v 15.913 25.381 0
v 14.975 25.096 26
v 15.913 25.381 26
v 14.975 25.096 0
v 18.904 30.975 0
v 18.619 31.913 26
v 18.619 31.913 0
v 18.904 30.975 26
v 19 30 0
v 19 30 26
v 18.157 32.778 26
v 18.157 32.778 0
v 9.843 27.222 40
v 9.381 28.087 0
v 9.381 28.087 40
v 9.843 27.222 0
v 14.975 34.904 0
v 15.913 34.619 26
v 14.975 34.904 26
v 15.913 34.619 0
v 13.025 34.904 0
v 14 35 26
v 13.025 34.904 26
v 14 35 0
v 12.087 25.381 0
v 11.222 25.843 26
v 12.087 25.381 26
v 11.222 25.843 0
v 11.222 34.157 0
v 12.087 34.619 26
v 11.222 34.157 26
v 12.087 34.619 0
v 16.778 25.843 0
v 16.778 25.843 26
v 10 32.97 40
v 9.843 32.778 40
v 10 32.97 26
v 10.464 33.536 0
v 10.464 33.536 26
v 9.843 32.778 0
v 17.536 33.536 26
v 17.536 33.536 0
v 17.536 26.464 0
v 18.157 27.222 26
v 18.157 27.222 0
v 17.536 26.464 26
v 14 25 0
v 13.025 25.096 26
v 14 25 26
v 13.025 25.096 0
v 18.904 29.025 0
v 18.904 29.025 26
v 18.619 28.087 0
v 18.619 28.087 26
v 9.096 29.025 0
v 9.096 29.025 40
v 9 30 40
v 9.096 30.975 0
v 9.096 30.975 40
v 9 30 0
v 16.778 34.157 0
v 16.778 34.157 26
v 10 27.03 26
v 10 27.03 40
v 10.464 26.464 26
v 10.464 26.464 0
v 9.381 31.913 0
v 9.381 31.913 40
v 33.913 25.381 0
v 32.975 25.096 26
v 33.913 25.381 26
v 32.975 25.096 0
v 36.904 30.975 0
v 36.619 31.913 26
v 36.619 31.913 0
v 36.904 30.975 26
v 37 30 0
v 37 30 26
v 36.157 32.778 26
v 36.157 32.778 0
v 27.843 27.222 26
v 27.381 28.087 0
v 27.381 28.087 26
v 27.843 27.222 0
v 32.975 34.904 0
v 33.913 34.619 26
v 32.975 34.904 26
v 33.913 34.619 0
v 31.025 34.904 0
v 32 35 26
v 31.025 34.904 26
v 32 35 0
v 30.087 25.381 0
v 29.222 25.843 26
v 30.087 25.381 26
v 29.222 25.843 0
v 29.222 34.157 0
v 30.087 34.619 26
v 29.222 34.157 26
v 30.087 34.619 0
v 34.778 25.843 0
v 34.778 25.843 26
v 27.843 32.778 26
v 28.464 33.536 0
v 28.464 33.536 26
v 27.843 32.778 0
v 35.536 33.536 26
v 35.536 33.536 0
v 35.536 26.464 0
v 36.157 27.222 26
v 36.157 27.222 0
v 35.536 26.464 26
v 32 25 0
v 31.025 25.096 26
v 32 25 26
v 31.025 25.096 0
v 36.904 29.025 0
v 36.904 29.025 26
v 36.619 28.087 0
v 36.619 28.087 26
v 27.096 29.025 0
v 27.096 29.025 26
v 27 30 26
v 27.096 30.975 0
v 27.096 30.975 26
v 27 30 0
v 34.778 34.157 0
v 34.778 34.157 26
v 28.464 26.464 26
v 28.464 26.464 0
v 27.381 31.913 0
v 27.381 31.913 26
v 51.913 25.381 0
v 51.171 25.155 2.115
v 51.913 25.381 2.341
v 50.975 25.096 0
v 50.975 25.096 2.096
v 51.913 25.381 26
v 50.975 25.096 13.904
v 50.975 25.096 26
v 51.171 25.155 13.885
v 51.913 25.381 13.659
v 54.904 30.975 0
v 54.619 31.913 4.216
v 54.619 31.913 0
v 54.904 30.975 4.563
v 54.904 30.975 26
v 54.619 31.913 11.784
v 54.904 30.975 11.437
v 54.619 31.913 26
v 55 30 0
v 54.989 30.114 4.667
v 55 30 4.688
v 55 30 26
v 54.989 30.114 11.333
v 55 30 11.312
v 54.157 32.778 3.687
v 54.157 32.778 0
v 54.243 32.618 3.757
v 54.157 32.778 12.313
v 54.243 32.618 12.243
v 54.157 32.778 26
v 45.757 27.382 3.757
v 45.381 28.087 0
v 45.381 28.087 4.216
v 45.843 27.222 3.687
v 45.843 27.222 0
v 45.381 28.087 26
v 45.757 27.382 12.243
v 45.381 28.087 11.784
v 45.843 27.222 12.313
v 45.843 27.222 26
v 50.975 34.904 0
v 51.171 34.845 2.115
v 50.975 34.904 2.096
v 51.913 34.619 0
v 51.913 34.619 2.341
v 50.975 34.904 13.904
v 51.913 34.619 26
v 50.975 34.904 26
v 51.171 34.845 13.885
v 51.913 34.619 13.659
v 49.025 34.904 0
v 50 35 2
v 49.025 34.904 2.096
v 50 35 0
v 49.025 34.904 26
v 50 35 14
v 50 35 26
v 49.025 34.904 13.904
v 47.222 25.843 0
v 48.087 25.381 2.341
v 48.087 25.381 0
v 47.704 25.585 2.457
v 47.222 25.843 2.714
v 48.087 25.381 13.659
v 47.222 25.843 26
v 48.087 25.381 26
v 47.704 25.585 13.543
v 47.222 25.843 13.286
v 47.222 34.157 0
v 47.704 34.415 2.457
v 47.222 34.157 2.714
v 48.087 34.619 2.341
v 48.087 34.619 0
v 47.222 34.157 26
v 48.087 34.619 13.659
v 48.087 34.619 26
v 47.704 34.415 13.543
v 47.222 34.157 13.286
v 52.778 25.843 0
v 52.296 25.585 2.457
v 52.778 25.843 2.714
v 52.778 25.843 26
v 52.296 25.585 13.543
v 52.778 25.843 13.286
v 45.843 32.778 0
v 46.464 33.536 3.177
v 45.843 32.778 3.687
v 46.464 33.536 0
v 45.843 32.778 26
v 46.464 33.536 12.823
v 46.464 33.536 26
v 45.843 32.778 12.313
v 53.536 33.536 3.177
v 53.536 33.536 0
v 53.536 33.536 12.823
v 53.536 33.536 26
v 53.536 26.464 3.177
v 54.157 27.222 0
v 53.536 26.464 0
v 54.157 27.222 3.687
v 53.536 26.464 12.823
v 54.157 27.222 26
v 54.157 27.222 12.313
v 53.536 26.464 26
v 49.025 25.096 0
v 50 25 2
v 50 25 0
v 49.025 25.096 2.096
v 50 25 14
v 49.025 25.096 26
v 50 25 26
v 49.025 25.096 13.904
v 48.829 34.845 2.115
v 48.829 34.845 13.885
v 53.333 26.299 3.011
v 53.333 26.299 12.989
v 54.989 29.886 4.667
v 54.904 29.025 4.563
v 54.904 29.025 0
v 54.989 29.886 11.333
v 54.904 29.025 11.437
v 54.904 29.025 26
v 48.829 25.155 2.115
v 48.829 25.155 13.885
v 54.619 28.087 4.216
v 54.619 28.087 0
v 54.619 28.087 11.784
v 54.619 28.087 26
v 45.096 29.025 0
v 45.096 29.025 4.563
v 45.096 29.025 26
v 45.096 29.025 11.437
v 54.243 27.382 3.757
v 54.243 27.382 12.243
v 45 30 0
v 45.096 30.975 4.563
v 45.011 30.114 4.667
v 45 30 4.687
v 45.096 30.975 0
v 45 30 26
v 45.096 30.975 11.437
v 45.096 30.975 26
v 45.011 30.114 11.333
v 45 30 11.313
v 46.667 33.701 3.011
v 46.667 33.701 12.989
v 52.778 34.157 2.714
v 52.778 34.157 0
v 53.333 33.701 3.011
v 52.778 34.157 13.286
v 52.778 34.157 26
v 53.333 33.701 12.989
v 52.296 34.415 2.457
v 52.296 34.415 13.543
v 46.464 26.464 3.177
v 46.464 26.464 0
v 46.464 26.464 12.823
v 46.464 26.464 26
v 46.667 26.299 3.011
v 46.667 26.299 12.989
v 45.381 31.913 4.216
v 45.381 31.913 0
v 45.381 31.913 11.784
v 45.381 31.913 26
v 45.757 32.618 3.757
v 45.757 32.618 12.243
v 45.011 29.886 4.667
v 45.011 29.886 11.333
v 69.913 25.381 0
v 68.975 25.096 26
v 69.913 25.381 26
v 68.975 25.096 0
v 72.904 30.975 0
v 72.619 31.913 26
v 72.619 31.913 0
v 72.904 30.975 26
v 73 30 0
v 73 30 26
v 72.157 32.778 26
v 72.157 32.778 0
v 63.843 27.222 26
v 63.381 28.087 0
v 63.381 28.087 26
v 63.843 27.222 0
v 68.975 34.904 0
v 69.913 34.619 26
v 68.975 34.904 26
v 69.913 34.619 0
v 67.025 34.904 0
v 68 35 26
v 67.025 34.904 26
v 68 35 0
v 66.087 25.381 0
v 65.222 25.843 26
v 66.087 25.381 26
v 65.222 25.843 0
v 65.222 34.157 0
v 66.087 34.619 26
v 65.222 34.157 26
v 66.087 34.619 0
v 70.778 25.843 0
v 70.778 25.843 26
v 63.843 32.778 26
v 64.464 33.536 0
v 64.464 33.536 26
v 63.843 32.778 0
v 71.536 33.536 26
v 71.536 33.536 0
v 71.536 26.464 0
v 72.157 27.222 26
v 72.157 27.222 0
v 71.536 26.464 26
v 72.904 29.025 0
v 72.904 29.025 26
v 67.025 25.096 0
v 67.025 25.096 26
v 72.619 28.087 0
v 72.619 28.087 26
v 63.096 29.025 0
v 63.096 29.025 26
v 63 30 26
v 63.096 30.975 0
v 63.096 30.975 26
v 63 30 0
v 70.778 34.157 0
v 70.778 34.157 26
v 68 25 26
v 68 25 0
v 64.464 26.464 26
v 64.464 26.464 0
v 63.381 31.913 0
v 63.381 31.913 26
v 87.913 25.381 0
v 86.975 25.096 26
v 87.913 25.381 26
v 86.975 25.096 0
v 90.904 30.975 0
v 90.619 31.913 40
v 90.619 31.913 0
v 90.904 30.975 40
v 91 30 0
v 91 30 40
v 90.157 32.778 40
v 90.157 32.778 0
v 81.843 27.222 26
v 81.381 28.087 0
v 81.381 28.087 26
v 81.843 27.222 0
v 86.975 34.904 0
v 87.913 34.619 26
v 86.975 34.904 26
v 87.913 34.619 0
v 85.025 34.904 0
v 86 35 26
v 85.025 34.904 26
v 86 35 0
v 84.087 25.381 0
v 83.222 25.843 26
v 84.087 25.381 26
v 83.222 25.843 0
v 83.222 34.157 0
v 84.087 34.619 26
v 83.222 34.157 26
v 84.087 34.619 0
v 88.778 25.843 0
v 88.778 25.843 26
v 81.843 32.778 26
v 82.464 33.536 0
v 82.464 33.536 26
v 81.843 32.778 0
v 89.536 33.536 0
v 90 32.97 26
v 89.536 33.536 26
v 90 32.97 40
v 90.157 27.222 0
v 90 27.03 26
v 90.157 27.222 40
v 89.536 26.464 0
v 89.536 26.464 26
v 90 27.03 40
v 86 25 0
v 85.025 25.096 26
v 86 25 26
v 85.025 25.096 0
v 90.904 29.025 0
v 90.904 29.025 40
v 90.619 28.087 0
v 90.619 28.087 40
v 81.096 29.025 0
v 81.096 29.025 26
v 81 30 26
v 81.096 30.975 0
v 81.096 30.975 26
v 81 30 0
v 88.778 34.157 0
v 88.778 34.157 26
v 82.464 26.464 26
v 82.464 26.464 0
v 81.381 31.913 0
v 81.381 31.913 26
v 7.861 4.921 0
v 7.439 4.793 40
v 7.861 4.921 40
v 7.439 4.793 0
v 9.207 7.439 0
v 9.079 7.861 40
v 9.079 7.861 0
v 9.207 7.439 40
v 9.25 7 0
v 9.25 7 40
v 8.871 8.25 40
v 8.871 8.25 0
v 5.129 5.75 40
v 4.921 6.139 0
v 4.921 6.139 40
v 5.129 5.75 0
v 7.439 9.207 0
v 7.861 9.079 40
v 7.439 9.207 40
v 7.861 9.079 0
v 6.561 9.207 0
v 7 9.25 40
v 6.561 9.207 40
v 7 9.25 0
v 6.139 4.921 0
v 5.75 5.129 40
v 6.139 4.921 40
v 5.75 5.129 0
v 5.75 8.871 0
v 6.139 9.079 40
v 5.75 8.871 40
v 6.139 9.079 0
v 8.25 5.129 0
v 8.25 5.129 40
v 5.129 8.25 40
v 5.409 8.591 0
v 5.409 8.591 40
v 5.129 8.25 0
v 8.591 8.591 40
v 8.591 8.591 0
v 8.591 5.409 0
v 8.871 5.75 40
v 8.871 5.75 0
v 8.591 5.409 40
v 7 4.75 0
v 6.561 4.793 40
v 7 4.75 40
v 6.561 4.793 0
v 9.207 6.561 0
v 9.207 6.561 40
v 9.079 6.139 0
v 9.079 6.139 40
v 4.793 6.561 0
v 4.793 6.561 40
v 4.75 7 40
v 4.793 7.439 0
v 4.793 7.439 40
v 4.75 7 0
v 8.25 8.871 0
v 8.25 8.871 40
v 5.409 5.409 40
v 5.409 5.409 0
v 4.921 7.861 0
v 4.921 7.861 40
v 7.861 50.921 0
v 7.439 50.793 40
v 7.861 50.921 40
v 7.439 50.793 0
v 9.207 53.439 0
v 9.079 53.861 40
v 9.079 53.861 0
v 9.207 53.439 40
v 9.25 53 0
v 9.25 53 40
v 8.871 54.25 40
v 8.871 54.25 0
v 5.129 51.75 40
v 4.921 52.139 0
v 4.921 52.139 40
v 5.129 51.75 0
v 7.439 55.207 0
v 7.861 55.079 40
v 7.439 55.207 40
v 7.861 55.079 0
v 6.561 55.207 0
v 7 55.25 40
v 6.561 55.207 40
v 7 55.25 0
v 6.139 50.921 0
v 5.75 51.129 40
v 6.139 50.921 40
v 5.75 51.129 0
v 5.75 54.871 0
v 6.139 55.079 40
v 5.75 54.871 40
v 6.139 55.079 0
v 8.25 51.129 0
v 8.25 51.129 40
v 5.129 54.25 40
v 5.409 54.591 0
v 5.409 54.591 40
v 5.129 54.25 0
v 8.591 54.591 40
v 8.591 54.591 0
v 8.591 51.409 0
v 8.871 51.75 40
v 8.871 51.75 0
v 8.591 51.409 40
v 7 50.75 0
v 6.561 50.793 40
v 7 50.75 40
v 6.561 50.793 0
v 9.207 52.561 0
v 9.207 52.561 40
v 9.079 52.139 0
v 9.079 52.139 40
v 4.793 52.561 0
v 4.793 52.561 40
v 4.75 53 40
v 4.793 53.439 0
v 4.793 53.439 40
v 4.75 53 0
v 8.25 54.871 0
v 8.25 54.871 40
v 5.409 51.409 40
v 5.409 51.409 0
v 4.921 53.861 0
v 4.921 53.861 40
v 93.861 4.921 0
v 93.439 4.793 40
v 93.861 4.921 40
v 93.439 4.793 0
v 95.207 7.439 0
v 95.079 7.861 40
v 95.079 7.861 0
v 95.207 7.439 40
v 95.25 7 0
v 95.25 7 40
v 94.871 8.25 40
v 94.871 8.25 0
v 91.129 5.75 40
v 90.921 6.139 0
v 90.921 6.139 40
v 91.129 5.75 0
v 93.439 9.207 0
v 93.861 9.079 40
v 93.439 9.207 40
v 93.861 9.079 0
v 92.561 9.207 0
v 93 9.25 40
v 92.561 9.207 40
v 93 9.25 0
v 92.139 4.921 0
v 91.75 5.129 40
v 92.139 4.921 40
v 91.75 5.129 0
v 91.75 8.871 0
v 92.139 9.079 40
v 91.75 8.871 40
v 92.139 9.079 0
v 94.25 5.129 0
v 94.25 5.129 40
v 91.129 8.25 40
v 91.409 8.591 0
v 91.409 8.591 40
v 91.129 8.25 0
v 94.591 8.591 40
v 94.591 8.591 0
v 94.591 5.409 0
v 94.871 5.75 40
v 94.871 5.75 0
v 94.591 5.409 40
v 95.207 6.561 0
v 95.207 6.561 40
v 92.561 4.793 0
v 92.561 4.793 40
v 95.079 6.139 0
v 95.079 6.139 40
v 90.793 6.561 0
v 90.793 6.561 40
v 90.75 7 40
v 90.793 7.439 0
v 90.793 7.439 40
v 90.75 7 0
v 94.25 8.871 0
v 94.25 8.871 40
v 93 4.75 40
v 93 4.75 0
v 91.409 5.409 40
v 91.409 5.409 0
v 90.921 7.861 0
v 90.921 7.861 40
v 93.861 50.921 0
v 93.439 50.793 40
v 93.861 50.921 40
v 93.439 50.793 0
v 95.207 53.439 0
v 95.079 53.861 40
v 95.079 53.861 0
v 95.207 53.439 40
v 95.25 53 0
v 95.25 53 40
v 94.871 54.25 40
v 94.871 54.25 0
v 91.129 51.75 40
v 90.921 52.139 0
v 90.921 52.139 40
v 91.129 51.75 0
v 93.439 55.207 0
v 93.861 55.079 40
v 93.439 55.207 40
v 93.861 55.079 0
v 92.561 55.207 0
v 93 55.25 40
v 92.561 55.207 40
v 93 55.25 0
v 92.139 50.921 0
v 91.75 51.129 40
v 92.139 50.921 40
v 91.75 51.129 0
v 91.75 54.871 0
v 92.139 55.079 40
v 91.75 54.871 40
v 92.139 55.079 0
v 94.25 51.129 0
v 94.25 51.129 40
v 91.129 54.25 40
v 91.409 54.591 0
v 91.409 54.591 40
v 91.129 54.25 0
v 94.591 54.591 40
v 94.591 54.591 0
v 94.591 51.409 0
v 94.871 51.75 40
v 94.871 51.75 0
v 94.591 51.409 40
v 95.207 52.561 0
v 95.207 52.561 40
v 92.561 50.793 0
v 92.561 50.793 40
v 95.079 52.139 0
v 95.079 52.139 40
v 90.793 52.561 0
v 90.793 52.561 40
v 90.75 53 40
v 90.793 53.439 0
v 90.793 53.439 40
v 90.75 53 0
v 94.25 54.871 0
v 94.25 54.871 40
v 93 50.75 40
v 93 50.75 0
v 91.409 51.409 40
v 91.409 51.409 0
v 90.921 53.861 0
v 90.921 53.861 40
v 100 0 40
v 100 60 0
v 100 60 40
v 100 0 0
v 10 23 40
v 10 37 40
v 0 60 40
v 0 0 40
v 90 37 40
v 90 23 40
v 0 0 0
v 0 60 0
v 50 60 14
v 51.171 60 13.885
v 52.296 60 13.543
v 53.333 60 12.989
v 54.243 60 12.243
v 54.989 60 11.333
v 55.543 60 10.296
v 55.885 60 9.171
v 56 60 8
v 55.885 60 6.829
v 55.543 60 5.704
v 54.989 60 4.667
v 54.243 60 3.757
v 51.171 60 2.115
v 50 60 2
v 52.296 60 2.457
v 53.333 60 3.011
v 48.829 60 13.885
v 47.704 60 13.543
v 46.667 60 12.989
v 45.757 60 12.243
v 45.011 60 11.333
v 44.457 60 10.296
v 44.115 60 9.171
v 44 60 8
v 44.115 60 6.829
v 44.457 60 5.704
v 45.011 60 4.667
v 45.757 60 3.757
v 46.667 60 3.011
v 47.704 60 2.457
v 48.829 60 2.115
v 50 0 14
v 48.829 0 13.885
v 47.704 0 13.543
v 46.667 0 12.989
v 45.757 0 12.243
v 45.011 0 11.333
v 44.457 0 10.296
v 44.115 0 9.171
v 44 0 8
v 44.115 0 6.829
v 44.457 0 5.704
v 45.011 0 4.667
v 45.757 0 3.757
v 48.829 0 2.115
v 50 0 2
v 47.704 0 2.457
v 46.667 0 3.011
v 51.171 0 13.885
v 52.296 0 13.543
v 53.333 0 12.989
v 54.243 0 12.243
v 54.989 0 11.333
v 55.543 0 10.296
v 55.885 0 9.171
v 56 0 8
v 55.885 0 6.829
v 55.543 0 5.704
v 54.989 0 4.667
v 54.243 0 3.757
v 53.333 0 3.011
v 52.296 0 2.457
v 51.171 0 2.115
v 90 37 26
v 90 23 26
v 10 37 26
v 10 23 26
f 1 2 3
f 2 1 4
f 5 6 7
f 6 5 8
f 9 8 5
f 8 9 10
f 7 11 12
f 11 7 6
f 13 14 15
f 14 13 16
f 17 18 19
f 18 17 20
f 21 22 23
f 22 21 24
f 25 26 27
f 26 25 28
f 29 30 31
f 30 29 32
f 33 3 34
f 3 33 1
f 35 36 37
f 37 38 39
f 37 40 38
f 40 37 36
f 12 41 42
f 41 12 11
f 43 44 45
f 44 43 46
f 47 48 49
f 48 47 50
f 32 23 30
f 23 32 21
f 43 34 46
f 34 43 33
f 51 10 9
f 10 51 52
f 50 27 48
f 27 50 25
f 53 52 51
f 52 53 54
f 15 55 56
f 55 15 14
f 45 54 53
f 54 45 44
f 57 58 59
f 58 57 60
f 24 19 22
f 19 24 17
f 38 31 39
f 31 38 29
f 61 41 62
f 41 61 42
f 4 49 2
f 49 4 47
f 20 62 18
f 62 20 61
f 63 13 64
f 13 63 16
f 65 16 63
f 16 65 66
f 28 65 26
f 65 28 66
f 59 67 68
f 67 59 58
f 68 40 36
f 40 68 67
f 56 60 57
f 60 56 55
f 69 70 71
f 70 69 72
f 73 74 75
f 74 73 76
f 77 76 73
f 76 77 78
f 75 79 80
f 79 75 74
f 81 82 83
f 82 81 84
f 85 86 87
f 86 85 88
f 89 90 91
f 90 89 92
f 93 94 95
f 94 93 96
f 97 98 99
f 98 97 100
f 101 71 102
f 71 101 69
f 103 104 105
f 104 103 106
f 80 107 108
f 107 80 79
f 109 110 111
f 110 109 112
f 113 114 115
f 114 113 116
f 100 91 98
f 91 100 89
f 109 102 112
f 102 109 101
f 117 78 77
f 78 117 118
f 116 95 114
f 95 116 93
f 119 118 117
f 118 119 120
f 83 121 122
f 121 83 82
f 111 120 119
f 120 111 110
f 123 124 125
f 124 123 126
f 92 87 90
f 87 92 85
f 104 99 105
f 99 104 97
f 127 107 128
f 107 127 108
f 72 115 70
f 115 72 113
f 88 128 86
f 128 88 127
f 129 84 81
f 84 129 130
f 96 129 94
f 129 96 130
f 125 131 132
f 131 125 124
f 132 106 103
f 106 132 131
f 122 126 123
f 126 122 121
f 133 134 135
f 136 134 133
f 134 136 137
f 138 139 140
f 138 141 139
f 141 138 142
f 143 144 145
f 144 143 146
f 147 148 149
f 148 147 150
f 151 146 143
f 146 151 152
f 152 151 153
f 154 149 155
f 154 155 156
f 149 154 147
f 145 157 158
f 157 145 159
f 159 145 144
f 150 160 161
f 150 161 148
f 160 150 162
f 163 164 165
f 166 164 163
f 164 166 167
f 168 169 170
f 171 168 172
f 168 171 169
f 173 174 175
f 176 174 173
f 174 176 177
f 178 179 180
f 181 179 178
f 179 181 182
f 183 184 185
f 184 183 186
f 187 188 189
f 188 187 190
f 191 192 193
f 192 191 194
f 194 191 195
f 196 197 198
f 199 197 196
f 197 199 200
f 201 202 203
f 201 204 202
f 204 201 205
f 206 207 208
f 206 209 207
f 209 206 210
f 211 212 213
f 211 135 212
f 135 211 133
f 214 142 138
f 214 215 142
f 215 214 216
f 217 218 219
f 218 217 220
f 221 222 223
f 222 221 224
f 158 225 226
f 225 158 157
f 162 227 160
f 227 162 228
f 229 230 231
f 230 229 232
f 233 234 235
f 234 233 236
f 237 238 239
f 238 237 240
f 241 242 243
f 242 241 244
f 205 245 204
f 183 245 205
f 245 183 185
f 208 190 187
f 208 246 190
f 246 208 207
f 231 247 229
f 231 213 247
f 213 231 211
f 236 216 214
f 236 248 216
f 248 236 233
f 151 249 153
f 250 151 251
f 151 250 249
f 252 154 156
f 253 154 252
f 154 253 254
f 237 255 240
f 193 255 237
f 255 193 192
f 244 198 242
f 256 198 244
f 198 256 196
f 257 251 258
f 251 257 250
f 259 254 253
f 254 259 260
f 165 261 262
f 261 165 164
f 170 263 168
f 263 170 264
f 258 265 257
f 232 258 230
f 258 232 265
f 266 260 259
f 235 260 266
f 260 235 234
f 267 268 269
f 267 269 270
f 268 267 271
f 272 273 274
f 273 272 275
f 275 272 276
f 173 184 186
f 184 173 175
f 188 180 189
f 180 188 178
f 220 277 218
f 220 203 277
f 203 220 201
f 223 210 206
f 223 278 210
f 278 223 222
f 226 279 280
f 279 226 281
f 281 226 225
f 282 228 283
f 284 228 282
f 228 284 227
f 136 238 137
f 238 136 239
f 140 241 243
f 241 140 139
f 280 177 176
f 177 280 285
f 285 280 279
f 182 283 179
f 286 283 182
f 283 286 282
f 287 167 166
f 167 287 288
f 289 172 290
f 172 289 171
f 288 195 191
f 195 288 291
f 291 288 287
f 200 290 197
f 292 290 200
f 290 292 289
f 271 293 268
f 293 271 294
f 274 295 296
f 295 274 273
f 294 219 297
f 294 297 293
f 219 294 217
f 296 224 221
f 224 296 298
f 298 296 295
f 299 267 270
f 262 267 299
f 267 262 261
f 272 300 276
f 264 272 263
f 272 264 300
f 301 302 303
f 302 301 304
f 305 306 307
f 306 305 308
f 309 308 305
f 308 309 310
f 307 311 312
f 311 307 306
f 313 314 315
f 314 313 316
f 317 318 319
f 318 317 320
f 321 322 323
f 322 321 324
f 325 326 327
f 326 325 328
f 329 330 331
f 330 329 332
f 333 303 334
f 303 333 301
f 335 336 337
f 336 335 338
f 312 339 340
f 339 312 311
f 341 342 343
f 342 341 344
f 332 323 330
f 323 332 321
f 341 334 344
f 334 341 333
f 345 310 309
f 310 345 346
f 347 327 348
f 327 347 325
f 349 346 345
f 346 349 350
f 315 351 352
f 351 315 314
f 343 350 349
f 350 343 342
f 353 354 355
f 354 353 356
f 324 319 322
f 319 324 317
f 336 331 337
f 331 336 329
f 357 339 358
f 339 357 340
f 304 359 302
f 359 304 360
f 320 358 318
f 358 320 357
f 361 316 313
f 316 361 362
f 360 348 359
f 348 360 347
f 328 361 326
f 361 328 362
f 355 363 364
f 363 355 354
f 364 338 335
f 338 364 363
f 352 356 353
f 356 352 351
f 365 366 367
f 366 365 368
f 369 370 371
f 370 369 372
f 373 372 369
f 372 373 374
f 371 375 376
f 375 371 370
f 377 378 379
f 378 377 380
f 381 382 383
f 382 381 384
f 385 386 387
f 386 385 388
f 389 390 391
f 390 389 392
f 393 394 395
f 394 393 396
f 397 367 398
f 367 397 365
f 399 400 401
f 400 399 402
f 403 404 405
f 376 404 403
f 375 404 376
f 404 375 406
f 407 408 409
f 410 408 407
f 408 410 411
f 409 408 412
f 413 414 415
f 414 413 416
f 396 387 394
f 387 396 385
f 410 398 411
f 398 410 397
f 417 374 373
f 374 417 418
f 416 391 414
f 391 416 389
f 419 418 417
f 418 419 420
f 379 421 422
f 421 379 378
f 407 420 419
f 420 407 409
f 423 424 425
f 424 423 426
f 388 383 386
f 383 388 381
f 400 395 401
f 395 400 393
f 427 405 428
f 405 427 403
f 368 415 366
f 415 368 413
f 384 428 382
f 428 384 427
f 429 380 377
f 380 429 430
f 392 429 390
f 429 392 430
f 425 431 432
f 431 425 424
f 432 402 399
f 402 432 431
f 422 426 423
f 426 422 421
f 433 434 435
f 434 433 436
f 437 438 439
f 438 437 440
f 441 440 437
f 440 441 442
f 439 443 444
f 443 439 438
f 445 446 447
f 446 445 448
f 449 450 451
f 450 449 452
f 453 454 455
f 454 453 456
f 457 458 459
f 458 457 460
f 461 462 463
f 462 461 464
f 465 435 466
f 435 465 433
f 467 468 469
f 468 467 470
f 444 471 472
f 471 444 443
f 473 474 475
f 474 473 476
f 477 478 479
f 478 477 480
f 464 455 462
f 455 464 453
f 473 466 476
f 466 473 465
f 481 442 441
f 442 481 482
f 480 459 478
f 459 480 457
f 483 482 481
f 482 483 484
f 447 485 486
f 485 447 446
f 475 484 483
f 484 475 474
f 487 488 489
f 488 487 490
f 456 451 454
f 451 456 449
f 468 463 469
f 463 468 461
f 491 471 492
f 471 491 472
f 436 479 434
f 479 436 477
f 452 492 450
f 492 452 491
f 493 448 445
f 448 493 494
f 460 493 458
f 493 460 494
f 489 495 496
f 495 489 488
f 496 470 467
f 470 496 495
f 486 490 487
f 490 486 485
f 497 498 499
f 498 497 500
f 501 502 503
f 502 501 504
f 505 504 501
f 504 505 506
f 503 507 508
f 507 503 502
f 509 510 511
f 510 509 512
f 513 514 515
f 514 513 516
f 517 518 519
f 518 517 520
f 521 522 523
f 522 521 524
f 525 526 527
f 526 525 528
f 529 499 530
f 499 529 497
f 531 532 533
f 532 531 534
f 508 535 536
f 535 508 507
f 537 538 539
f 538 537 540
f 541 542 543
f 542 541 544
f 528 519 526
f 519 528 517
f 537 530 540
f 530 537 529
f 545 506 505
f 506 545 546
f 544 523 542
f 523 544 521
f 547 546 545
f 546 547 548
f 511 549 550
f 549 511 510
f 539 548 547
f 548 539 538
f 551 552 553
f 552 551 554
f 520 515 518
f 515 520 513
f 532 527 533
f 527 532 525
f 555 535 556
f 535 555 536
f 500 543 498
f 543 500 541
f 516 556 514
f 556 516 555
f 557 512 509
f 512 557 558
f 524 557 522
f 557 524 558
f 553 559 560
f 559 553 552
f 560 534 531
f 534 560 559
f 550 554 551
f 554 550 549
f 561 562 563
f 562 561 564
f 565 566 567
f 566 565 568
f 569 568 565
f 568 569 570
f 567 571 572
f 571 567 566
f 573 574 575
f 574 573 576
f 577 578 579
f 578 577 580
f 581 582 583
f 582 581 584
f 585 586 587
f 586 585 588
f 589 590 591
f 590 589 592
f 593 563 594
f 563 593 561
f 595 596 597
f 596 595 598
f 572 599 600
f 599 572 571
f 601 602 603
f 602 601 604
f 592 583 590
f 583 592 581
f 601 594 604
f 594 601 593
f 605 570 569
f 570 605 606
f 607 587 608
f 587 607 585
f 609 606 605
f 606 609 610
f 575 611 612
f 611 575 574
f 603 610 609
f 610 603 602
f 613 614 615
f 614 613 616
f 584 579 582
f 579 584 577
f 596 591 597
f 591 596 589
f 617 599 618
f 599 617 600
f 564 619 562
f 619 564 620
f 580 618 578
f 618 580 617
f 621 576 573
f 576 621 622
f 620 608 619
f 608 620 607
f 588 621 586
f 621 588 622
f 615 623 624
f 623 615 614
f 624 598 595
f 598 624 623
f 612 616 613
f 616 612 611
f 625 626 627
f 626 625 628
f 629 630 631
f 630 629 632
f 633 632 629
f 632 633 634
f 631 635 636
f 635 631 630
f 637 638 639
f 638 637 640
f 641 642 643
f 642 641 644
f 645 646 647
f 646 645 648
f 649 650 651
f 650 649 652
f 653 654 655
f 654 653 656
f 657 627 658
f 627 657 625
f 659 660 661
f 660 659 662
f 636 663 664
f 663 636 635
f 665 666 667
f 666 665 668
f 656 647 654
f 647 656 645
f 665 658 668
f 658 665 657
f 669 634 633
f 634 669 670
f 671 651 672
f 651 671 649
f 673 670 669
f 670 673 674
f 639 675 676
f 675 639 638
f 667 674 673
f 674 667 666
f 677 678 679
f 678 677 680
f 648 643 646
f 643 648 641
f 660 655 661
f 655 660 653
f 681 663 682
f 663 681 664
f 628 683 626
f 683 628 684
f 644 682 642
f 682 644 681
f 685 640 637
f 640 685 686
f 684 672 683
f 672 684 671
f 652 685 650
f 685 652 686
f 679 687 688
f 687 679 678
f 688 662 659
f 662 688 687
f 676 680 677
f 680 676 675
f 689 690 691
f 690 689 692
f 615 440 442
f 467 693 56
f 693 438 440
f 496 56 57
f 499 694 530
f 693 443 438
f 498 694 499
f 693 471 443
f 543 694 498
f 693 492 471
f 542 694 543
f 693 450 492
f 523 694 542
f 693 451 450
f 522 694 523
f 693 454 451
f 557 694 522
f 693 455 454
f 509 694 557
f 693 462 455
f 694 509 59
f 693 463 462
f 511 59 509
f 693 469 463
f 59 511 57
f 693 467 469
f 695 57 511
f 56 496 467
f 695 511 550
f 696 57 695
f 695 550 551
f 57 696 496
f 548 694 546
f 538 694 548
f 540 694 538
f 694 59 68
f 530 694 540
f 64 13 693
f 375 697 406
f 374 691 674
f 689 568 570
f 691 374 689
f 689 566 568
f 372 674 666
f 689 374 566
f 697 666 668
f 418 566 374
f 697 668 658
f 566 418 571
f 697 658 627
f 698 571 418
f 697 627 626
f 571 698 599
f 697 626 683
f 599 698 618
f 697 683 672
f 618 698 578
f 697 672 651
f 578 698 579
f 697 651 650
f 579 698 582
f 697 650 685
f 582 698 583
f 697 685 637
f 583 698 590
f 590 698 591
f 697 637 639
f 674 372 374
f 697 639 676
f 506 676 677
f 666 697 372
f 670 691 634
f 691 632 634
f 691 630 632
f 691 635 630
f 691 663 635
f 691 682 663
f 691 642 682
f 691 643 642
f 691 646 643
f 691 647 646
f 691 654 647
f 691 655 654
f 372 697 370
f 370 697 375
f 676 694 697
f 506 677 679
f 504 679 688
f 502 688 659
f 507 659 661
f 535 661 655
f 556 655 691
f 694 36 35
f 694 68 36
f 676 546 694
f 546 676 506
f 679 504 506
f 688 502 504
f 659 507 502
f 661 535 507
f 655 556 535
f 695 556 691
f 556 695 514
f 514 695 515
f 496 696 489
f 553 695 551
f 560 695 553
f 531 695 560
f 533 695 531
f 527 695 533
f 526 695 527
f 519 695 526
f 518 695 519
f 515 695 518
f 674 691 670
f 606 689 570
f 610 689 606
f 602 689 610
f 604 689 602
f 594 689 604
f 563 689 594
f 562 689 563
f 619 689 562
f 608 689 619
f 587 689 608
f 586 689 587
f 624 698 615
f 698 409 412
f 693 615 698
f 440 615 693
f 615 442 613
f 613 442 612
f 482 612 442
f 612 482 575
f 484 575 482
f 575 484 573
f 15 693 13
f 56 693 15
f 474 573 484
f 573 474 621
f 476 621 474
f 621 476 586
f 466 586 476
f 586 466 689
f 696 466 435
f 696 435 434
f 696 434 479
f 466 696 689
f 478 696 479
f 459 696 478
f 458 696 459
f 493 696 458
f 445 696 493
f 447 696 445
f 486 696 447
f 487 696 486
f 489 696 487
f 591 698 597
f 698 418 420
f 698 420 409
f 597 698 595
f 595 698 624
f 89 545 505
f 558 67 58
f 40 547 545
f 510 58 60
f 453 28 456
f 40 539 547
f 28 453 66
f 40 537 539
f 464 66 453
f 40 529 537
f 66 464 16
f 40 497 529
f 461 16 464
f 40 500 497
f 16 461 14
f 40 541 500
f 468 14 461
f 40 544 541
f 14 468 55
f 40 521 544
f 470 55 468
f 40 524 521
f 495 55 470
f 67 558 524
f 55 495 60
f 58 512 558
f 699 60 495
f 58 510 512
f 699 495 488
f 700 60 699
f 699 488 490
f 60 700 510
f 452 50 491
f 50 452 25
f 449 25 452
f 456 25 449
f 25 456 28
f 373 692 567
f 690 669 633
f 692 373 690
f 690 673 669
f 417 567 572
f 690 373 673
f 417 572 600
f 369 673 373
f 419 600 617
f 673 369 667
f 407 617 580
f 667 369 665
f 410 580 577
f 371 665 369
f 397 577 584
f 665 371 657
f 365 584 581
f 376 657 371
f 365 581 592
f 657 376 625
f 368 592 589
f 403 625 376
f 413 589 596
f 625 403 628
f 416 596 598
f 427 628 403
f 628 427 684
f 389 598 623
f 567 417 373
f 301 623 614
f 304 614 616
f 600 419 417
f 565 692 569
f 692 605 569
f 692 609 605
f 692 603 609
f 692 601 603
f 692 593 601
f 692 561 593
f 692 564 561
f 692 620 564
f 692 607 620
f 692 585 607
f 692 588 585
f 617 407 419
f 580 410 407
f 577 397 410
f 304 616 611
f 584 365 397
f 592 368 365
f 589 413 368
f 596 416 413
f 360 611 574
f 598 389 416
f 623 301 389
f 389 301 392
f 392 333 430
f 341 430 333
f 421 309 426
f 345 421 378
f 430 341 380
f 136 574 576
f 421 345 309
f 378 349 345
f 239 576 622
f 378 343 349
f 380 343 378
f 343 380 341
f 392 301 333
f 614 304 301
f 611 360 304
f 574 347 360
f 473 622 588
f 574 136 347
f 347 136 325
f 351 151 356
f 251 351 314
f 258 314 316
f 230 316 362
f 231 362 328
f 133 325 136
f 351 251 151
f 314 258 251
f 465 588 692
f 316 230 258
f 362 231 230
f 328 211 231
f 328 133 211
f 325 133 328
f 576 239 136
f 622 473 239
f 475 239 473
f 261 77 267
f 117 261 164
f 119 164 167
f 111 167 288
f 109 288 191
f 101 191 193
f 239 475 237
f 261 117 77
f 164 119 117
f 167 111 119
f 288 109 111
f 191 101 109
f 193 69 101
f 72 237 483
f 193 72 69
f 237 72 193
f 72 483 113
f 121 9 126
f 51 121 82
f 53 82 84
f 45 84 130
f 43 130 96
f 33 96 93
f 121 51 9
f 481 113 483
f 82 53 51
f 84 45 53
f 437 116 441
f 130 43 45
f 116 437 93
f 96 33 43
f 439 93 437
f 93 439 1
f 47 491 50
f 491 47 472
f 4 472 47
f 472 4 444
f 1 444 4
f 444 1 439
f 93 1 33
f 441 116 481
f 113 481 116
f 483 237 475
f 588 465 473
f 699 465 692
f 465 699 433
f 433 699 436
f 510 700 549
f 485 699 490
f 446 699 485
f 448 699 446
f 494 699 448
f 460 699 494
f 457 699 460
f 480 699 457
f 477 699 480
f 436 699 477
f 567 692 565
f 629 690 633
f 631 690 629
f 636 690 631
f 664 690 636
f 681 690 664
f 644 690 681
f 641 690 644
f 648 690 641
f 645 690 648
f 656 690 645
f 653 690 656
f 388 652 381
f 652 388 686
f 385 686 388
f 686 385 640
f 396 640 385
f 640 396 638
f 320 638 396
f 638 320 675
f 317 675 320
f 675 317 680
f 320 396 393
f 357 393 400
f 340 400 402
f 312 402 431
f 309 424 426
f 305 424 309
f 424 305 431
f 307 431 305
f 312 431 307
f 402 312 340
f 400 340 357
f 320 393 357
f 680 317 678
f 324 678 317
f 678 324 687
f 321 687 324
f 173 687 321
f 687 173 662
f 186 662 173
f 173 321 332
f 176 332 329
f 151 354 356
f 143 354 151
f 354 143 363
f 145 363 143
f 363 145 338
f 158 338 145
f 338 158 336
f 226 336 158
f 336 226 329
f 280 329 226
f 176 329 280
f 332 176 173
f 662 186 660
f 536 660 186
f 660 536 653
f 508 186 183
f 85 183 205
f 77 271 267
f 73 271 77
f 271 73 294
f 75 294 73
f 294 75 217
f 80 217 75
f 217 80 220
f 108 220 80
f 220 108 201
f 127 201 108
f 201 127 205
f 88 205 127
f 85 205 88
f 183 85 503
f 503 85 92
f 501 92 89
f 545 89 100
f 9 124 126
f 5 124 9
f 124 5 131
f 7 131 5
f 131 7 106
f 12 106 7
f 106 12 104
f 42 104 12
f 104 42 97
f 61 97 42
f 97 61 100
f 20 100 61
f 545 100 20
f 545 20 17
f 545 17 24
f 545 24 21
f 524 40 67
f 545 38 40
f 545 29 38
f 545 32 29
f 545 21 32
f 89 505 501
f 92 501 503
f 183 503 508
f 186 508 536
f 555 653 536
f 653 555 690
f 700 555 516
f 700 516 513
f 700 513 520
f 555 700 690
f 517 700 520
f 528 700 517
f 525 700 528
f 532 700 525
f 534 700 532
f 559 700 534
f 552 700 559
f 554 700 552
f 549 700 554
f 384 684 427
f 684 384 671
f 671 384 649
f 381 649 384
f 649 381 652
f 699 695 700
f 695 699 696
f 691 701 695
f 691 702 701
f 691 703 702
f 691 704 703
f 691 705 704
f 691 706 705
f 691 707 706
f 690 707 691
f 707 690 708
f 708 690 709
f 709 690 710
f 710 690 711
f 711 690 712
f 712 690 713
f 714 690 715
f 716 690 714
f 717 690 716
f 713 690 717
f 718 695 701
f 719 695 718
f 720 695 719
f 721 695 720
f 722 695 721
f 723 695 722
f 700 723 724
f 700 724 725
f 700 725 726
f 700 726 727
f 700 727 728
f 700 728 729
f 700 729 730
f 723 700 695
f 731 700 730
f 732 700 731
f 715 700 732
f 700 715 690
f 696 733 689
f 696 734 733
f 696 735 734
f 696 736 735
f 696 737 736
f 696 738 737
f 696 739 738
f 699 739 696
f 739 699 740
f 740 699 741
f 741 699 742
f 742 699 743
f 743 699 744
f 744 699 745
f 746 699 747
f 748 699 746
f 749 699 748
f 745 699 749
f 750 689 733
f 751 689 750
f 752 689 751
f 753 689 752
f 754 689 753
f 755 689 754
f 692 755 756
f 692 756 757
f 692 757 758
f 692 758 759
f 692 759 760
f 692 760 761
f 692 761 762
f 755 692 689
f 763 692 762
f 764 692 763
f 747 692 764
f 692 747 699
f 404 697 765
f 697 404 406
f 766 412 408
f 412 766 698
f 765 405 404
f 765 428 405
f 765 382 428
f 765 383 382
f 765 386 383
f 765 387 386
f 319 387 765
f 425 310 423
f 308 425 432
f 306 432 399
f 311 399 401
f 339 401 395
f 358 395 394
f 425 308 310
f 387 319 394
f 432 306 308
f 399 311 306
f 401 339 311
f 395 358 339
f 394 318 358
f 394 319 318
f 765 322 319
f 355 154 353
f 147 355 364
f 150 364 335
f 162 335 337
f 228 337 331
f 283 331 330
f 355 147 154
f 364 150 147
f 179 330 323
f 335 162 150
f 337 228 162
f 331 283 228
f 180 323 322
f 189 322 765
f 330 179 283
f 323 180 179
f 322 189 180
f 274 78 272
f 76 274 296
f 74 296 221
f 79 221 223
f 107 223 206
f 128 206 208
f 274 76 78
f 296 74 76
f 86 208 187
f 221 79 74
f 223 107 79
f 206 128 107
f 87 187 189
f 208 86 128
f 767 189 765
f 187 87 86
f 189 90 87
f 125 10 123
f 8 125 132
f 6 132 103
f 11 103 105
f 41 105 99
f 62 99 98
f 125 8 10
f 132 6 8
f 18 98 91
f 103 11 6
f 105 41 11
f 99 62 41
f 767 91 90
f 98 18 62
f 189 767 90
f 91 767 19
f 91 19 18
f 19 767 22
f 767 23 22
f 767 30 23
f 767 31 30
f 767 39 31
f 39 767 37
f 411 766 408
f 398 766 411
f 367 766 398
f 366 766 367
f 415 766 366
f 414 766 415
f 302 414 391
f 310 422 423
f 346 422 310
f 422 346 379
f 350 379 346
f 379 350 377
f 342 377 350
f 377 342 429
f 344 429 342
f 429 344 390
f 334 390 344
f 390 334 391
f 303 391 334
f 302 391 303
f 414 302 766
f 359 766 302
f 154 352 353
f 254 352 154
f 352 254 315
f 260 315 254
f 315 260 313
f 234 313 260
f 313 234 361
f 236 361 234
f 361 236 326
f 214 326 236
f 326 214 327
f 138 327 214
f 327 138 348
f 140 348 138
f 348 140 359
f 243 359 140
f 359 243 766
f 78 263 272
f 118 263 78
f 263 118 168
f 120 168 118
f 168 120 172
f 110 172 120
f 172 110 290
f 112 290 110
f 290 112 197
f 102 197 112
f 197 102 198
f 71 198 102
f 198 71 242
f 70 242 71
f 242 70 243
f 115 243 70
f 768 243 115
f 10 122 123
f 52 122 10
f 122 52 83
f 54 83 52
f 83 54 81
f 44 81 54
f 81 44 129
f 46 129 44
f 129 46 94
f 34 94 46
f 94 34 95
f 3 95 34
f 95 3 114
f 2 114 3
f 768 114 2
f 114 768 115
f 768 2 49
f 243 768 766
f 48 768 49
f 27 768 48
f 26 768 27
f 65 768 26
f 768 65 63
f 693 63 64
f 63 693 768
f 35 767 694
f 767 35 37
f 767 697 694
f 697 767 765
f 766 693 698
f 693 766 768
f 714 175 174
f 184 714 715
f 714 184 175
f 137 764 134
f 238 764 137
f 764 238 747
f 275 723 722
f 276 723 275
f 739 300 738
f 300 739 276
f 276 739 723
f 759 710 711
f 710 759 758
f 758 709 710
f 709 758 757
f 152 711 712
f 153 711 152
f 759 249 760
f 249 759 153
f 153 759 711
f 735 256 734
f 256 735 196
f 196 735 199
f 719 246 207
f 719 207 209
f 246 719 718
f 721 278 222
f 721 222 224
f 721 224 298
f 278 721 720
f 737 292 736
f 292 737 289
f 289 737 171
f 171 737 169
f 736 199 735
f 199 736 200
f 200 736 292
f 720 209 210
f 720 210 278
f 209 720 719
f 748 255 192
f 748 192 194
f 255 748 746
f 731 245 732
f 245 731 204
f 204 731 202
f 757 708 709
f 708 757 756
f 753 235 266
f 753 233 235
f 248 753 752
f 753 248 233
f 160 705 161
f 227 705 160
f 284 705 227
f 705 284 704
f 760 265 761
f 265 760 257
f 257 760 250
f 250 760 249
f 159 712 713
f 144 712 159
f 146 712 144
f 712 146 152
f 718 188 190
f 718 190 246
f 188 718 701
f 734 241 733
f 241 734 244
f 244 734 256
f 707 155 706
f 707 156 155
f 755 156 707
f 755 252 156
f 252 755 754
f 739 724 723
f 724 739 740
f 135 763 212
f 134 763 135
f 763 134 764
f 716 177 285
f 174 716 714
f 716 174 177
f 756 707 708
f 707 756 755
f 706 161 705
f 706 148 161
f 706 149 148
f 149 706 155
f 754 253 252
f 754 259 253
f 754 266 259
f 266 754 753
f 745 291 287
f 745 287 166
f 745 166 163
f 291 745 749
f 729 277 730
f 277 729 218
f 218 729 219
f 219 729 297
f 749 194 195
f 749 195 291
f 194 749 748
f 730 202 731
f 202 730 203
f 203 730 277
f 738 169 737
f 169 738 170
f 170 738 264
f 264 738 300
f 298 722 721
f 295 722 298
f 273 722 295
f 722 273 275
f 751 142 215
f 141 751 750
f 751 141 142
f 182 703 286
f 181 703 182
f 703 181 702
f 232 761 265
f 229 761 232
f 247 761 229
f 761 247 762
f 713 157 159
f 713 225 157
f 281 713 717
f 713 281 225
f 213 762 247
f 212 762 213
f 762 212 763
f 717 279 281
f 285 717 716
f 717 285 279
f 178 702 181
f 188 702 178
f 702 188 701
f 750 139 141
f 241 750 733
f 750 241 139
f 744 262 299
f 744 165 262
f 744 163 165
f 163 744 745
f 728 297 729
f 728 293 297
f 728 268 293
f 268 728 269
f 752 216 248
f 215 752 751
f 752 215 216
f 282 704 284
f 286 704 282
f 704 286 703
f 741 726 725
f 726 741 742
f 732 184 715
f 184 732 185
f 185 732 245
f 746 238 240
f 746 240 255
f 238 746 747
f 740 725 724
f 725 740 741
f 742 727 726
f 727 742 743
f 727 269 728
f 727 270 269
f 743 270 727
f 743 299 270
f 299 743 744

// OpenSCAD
$fn = 32;

// ----------------------------------------------------------------------
// Manifold block: side_outlet manifold
// ----------------------------------------------------------------------

// --- parameters (mm) ---
block_l = 100;            // block length, X
block_w = 60;             // block width, Y
block_h = 40;             // block height, Z
port_d = 10;              // port bore diameter
port_pitch = 18;          // port pitch along X
gallery_d = 14;           // top gallery width, Y
gallery_depth = 14;       // gallery pocket depth
wall_p = 10;              // gallery end wall thickness, X
mnt_d = 4.5;              // mounting hole diameter
mnt_in = 7;               // mounting hole inset from the edges
out_d = 12;               // outlet bore diameter
out_z = 8;                // outlet axis height

n_ports = 5;  // ports in the row
port_x0 = (block_l - (n_ports - 1) * port_pitch) / 2;  // first port X

difference() {
  cube([block_l, block_w, block_h]);
  for (i = [0 : n_ports - 1])
    translate([port_x0 + i * port_pitch, block_w / 2, -1])
      cylinder(h = block_h + 2, d = port_d);
  translate([wall_p, block_w / 2 - gallery_d / 2, block_h - gallery_depth])
    cube([block_l - 2 * wall_p, gallery_d, gallery_depth + 1]);
  for (cx = [mnt_in, block_l - mnt_in])
    for (cy = [mnt_in, block_w - mnt_in])
      translate([cx, cy, -1]) cylinder(h = block_h + 2, d = mnt_d);
  translate([block_l / 2, -1, out_z]) rotate([-90, 0, 0])
    cylinder(h = block_w + 2, d = out_d);
}
